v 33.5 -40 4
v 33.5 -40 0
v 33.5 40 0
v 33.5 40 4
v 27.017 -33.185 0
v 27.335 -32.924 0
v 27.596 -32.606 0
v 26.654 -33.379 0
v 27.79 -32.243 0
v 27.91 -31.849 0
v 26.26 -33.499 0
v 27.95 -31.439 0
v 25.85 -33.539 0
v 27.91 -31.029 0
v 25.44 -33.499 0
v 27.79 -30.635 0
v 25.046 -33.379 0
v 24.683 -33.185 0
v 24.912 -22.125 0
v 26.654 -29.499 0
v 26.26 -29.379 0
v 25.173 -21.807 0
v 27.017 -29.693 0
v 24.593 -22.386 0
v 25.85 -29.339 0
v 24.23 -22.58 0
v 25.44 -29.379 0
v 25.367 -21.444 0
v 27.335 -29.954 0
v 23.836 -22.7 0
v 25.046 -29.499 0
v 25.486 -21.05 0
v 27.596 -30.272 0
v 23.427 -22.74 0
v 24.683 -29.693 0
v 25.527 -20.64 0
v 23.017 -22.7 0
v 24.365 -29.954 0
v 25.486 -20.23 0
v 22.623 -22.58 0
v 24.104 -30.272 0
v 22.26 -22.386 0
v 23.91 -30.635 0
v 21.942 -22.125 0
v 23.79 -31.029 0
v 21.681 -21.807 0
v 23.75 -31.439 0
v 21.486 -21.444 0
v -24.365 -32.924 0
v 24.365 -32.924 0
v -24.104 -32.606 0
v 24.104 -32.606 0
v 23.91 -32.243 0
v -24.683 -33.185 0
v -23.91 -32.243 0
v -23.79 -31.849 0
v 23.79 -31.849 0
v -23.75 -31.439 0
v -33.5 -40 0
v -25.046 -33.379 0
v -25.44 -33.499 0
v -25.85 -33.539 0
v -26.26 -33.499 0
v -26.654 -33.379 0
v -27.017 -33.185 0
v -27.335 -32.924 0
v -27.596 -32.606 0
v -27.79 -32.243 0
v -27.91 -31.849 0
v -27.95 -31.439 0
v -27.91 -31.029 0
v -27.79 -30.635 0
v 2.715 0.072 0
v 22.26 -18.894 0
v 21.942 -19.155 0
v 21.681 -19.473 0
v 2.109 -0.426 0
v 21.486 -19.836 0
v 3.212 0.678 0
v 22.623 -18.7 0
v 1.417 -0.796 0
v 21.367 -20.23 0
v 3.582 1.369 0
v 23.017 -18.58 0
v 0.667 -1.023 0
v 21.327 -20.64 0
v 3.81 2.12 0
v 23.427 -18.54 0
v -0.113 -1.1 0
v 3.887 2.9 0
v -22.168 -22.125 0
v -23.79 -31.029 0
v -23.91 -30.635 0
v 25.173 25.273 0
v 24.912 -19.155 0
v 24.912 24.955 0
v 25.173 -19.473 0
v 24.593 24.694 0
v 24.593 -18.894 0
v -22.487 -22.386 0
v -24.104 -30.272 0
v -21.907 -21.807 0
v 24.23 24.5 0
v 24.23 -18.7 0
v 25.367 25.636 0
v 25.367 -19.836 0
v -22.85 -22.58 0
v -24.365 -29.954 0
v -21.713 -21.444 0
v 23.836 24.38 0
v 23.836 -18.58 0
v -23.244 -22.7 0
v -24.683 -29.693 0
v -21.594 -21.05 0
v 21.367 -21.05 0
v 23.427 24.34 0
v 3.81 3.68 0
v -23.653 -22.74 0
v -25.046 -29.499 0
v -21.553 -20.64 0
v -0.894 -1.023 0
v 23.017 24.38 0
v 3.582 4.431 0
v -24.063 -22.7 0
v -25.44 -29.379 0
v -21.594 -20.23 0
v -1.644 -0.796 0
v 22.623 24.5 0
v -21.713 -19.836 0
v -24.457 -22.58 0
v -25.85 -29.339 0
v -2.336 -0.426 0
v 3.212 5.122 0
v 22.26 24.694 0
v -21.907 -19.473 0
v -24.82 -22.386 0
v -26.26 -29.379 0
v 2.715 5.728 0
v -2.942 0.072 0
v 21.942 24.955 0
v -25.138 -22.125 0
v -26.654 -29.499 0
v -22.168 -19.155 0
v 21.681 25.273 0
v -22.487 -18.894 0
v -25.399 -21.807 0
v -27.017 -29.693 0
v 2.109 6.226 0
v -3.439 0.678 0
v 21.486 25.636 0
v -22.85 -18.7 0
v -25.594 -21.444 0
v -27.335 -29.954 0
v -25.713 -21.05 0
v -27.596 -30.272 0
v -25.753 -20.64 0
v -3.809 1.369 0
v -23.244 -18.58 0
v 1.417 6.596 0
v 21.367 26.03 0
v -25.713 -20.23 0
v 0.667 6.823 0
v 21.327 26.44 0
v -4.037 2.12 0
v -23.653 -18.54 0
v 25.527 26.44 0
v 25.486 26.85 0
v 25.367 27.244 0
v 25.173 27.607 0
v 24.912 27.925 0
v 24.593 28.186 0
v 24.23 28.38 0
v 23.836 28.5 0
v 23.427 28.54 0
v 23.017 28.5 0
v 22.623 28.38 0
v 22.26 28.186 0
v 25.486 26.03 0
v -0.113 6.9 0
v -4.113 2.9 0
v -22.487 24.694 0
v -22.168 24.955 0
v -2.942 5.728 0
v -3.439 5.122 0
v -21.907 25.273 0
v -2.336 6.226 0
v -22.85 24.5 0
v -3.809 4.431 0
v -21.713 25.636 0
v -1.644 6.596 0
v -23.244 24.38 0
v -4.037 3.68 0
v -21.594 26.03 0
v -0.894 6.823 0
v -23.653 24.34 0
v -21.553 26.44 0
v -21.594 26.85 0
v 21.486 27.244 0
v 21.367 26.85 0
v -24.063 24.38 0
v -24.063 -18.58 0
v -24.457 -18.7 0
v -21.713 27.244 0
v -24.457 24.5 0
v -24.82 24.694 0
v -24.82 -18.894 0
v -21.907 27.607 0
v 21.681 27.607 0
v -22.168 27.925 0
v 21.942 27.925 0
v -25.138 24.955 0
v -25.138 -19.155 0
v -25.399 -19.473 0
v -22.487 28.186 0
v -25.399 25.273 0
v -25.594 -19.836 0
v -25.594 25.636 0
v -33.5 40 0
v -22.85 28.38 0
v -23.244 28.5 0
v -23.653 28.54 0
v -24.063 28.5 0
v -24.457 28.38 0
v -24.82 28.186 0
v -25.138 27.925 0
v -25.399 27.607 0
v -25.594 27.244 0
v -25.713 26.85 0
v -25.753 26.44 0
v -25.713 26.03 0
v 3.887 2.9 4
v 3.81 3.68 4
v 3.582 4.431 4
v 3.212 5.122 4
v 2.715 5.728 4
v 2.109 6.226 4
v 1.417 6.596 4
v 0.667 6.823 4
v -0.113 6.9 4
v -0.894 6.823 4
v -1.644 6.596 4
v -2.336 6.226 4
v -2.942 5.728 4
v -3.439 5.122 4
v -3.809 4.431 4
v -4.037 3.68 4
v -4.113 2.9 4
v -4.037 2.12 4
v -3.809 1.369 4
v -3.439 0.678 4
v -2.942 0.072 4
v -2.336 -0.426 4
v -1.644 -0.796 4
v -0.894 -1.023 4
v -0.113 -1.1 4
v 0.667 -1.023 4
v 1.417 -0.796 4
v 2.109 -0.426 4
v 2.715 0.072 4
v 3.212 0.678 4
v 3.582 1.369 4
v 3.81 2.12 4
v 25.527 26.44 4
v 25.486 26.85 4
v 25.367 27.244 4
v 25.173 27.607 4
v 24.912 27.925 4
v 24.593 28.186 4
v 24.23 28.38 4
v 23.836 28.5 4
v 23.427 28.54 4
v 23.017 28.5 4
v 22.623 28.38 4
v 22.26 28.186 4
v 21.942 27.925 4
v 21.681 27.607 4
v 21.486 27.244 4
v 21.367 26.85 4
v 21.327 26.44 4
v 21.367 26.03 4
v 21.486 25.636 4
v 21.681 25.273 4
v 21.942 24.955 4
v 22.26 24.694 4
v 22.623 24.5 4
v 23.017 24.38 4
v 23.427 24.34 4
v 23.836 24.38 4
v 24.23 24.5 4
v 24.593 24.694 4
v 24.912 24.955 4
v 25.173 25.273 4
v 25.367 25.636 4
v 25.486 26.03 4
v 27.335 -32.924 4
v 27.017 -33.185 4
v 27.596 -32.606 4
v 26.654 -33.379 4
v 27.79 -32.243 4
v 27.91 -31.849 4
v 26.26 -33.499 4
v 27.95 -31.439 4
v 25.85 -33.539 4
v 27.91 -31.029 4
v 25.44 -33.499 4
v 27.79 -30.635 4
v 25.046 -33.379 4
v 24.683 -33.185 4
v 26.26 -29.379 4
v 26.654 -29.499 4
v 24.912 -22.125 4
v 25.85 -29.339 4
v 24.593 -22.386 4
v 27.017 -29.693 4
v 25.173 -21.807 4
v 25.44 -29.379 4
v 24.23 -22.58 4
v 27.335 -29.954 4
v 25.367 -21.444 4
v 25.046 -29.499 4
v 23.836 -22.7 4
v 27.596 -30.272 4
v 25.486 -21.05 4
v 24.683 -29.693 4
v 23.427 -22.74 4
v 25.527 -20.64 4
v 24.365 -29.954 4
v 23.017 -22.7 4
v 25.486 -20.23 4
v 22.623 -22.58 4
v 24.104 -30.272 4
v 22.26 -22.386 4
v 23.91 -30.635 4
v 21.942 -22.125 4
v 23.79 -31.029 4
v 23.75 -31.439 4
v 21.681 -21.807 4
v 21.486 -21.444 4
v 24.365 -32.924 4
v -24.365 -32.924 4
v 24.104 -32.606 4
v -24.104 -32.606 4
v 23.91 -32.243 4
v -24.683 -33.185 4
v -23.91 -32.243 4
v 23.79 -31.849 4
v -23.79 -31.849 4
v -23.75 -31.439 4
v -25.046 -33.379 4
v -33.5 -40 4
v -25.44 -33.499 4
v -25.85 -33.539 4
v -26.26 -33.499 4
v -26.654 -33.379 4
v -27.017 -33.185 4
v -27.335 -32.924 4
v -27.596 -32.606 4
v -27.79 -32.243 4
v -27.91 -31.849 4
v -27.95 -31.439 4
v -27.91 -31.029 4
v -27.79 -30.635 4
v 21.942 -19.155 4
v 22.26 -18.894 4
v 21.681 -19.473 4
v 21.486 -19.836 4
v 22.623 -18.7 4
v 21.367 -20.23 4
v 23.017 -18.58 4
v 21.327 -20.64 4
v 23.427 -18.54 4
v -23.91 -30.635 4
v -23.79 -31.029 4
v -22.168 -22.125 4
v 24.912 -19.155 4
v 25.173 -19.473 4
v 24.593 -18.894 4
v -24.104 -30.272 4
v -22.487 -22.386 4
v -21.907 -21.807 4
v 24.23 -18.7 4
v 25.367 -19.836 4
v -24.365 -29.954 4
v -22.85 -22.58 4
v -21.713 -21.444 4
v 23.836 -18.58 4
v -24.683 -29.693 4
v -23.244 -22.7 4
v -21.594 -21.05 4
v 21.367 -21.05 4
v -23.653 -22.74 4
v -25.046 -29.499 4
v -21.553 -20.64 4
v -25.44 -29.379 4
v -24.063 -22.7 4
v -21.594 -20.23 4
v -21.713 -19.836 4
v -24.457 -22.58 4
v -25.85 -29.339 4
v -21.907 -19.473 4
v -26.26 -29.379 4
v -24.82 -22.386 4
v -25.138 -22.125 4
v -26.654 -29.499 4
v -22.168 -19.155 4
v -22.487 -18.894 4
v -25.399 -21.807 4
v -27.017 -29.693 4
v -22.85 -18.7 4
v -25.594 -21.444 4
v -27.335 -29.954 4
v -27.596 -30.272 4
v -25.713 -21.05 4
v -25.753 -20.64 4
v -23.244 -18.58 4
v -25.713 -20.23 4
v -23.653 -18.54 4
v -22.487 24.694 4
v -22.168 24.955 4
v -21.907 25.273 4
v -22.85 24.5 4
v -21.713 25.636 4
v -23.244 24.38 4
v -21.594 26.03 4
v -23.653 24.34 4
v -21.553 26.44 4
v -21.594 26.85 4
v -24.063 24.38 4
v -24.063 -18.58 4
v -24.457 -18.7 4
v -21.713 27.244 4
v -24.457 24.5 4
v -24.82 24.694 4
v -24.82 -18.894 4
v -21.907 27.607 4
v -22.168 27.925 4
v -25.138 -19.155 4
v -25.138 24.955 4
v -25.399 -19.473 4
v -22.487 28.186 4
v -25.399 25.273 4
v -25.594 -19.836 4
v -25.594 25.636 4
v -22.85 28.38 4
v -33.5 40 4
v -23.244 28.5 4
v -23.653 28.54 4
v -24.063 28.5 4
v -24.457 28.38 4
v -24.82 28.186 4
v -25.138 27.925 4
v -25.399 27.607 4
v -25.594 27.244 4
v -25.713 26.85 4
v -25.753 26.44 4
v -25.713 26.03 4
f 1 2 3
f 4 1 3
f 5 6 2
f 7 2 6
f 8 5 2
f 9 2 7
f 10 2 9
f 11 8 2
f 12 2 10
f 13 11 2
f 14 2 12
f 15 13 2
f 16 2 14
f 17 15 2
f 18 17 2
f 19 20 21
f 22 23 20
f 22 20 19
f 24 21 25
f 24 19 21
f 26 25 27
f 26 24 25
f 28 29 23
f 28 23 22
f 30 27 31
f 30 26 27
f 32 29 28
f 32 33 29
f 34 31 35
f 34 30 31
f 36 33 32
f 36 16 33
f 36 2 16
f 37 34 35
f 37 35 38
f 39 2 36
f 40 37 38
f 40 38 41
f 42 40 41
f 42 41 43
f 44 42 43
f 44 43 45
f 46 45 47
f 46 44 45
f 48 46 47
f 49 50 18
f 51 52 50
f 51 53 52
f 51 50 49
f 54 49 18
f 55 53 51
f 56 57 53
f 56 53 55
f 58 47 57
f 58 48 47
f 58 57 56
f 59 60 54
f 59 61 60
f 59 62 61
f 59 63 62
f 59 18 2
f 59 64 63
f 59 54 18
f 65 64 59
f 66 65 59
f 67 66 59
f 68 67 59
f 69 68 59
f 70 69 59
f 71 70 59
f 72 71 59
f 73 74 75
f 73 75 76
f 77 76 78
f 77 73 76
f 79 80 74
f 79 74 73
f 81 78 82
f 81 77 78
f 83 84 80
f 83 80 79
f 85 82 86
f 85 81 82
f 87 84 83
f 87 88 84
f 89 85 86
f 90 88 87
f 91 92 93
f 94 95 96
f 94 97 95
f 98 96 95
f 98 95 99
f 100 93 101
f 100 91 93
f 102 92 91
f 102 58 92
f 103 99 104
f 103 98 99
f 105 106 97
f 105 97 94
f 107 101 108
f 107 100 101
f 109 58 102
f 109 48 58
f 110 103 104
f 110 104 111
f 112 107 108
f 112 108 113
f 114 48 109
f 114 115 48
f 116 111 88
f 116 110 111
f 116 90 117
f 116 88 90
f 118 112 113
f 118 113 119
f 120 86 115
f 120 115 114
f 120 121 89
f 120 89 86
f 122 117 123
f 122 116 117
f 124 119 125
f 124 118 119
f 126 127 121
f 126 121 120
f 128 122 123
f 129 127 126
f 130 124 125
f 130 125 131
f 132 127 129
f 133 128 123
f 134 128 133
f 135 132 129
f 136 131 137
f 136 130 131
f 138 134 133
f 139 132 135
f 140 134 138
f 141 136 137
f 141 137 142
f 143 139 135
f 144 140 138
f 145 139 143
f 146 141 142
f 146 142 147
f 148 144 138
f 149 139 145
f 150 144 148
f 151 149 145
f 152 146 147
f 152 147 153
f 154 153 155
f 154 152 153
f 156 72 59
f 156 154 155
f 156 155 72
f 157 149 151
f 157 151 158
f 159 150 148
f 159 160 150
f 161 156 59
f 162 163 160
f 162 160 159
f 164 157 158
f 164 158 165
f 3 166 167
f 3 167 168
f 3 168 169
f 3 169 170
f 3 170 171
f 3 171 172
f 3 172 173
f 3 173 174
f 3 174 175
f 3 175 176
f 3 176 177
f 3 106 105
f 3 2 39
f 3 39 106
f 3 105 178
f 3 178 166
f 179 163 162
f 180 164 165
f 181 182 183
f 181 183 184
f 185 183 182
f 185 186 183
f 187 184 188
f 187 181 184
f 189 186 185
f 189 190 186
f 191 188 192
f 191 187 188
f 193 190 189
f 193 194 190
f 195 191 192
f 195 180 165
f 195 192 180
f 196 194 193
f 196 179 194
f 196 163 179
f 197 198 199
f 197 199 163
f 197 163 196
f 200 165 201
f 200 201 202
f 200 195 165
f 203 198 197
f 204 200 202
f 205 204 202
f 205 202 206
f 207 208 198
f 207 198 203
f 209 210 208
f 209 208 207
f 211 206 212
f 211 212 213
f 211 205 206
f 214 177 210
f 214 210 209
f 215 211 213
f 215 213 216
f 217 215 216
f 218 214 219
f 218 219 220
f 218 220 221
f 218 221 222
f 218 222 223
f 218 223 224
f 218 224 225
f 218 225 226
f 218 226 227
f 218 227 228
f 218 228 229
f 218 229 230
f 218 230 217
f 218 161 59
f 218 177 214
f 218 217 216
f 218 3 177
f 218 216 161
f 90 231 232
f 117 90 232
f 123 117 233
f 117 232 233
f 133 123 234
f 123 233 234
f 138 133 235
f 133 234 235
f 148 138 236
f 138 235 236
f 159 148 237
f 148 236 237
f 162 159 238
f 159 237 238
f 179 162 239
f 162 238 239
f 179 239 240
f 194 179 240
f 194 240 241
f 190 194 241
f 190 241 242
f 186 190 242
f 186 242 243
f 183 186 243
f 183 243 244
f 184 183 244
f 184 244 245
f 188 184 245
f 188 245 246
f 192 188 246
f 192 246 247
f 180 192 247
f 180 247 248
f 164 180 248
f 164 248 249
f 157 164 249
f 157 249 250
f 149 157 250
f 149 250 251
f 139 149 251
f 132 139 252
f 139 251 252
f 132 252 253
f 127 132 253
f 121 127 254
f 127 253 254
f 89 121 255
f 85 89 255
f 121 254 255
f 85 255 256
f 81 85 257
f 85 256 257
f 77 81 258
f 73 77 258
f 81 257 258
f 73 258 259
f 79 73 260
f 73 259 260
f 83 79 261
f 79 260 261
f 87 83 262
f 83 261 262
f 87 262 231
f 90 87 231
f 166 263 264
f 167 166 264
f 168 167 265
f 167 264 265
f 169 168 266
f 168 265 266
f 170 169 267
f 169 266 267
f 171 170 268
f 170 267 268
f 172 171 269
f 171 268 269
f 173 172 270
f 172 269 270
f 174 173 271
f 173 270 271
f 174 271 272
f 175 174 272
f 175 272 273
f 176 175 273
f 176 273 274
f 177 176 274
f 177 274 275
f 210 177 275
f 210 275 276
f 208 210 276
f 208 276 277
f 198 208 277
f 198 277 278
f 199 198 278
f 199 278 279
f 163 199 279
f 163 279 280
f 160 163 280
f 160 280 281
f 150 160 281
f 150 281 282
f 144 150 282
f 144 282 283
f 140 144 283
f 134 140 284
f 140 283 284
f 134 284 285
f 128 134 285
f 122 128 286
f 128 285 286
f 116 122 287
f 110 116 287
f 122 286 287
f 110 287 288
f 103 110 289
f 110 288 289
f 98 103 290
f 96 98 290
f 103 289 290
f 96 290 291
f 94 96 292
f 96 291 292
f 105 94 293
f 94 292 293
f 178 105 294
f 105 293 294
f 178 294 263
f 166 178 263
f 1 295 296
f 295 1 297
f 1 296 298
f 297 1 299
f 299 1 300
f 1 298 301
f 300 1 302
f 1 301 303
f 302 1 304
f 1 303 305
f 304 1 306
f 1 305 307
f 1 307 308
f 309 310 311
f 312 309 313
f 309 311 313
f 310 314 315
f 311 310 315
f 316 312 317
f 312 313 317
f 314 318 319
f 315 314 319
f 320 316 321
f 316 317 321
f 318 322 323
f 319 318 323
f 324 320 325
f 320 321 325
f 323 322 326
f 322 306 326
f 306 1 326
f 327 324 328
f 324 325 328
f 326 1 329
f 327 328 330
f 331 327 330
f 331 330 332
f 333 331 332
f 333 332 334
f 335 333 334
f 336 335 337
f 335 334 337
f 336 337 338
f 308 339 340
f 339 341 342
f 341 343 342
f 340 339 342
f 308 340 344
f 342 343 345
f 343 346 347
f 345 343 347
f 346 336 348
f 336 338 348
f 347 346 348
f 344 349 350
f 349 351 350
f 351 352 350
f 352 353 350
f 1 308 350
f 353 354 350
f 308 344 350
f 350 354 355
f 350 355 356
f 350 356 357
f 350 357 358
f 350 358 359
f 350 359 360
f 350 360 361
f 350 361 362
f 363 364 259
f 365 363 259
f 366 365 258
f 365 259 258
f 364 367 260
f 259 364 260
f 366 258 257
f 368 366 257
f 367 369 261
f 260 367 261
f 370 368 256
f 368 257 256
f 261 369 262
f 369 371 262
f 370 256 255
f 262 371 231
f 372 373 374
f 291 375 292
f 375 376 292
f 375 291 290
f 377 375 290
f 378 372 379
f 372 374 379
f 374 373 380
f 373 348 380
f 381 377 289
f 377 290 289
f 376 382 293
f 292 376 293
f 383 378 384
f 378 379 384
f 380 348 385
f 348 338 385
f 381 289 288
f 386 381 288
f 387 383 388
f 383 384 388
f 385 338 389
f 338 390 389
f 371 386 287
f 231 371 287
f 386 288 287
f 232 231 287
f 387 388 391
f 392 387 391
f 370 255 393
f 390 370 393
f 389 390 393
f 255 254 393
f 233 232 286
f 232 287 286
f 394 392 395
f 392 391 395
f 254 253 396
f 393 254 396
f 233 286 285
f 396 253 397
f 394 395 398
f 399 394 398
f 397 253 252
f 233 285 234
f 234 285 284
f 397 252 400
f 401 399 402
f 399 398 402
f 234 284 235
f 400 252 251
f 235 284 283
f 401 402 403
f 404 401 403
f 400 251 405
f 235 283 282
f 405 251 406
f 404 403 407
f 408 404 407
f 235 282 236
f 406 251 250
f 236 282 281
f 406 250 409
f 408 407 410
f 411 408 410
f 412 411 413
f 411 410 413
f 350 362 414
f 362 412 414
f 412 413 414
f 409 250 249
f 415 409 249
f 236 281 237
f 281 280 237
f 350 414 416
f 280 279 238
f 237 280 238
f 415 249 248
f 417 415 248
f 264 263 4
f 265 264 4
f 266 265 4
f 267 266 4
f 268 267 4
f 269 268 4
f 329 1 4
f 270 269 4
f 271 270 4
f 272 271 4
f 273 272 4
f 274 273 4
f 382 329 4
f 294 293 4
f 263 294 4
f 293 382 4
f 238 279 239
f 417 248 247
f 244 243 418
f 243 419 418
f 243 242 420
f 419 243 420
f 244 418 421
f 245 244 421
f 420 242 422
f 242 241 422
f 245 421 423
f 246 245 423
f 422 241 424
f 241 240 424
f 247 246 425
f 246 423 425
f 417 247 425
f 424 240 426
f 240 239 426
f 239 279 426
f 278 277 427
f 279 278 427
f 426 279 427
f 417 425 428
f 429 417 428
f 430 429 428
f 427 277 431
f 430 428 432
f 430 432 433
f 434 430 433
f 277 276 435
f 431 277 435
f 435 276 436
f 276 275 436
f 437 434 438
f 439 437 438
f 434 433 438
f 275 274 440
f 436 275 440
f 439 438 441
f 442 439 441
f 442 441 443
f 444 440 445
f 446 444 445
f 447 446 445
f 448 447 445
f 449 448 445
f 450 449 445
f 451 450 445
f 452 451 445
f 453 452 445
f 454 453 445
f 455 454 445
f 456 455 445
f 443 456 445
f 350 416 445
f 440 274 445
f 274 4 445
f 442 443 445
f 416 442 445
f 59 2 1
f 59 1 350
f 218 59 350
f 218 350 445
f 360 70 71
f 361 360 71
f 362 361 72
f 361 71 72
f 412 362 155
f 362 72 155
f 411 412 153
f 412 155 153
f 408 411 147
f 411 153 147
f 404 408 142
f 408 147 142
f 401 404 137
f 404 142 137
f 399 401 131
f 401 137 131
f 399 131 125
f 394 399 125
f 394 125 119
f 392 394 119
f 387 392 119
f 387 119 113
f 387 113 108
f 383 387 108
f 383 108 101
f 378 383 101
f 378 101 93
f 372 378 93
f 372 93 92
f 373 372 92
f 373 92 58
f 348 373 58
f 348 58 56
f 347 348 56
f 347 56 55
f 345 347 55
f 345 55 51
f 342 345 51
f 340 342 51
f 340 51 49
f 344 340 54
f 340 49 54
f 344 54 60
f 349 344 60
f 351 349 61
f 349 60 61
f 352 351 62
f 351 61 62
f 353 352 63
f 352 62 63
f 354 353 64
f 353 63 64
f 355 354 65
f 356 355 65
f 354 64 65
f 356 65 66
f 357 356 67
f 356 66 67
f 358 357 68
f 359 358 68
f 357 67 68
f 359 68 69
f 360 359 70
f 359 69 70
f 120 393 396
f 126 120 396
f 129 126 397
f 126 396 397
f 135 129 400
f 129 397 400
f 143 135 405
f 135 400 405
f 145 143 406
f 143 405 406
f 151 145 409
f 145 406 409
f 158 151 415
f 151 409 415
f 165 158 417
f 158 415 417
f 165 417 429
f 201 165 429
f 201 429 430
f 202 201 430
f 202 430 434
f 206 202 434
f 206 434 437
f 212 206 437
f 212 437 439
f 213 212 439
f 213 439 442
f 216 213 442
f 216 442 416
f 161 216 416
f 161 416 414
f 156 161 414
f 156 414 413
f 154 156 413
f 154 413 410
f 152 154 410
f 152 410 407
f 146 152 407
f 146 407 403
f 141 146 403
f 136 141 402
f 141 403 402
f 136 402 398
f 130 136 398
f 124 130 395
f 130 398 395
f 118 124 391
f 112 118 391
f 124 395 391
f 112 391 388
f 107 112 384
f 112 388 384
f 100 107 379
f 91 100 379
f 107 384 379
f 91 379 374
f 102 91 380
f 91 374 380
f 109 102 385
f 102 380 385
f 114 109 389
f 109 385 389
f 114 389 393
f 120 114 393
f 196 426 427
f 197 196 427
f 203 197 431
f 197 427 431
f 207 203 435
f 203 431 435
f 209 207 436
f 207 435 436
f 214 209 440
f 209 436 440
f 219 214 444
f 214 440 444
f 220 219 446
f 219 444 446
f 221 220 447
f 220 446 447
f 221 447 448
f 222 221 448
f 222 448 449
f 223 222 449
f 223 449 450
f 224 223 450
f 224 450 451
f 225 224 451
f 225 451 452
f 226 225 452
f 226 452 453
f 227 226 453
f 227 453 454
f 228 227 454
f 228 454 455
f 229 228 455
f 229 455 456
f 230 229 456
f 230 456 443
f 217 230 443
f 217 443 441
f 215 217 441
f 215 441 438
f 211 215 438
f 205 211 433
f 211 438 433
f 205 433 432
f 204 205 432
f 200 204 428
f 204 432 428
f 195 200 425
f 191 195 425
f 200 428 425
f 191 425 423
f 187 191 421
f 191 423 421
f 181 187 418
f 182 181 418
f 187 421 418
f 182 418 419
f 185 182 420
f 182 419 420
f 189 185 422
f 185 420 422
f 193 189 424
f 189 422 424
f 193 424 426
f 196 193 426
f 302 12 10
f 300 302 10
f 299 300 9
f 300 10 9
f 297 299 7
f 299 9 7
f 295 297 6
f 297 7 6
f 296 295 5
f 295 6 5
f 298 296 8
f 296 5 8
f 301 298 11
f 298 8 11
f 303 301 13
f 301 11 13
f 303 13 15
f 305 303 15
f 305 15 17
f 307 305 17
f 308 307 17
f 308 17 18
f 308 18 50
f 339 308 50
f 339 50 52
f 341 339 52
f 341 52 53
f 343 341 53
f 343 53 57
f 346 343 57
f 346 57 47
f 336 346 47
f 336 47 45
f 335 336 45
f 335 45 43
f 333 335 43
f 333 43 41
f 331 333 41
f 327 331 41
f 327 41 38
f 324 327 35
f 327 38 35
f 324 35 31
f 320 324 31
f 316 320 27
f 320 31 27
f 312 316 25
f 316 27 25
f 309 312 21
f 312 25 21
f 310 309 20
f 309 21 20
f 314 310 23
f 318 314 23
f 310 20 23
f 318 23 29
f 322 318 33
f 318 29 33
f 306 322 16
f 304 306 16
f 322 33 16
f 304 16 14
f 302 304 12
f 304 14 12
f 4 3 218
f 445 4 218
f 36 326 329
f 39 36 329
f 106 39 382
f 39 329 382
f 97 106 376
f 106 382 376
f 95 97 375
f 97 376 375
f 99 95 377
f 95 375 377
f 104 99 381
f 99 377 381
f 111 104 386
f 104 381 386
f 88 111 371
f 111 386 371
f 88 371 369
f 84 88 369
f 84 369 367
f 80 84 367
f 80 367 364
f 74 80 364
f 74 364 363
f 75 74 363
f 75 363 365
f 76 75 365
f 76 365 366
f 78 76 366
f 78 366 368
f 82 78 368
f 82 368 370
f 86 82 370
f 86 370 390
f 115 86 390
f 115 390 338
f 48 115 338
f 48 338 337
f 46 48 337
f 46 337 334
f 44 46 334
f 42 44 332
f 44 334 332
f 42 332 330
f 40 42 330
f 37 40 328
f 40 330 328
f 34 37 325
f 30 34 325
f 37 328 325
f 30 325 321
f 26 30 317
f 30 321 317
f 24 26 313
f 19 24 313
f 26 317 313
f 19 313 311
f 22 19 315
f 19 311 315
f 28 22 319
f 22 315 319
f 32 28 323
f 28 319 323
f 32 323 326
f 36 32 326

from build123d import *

# Parameters (mm, degrees)
ESQUISSE1_W             = 65
ESQUISSE1_H             = 80
BOSS_EXTRU_1_DEPTH      = 4
ESQUISSE2_R             = 2.1
ENL_V_MAT_EXTRU_1_DEPTH = 52.693810074
ESQUISSE3_R             = 2.1
ESQUISSE3_R_2           = 4
ENL_V_MAT_EXTRU_2_DEPTH = 52.693810074
ESQUISSE4_W             = 1
ESQUISSE4_H             = 80
BOSS_EXTRU_2_DEPTH      = 4


with BuildPart() as part:
    # Esquisse1 → Boss.-Extru.1 (new body)
    with BuildSketch(Plane.XY):
        Rectangle(ESQUISSE1_W, ESQUISSE1_H)
    extrude(amount=BOSS_EXTRU_1_DEPTH)

    # Esquisse2 → Enlèv. mat.-Extru.1 (cut, through all)
    with BuildSketch(Plane(origin=(0, 0, 0), x_dir=(-1, 0, 0), z_dir=(0, 0, -1))):
        with Locations((25.85, -31.43902252)):
            Circle(ESQUISSE2_R)
        with Locations(Location((-25.85, -31.43902252, 0), (0, 0, 180))):
            Circle(ESQUISSE2_R)
    extrude(amount=-ENL_V_MAT_EXTRU_1_DEPTH, mode=Mode.SUBTRACT)

    # Esquisse3 → Enlèv. mat.-Extru.2 (cut, through all)
    with BuildSketch(Plane.XY.offset(4)):
        with Locations((-23.653359533, -20.639976695)):
            Circle(ESQUISSE3_R)
        with Locations((23.426593857, -20.639976695)):
            Circle(ESQUISSE3_R)
        with Locations((23.426593857, 26.439976695)):
            Circle(ESQUISSE3_R)
        with Locations((-23.653359533, 26.439976695)):
            Circle(ESQUISSE3_R)
        with Locations((-0.113382838, 2.9)):
            Circle(ESQUISSE3_R_2)
    extrude(amount=-ENL_V_MAT_EXTRU_2_DEPTH, mode=Mode.SUBTRACT)

    # Esquisse4 → Boss.-Extru.2 (add)
    with BuildSketch(Plane(origin=(0, 0, 0), x_dir=(-1, 0, 0), z_dir=(0, 0, -1))):
        with Locations((33, 0)):
            Rectangle(ESQUISSE4_W, ESQUISSE4_H)
        with Locations((-33, 0)):
            Rectangle(ESQUISSE4_W, ESQUISSE4_H)
    extrude(amount=-BOSS_EXTRU_2_DEPTH)


solid = part.part
